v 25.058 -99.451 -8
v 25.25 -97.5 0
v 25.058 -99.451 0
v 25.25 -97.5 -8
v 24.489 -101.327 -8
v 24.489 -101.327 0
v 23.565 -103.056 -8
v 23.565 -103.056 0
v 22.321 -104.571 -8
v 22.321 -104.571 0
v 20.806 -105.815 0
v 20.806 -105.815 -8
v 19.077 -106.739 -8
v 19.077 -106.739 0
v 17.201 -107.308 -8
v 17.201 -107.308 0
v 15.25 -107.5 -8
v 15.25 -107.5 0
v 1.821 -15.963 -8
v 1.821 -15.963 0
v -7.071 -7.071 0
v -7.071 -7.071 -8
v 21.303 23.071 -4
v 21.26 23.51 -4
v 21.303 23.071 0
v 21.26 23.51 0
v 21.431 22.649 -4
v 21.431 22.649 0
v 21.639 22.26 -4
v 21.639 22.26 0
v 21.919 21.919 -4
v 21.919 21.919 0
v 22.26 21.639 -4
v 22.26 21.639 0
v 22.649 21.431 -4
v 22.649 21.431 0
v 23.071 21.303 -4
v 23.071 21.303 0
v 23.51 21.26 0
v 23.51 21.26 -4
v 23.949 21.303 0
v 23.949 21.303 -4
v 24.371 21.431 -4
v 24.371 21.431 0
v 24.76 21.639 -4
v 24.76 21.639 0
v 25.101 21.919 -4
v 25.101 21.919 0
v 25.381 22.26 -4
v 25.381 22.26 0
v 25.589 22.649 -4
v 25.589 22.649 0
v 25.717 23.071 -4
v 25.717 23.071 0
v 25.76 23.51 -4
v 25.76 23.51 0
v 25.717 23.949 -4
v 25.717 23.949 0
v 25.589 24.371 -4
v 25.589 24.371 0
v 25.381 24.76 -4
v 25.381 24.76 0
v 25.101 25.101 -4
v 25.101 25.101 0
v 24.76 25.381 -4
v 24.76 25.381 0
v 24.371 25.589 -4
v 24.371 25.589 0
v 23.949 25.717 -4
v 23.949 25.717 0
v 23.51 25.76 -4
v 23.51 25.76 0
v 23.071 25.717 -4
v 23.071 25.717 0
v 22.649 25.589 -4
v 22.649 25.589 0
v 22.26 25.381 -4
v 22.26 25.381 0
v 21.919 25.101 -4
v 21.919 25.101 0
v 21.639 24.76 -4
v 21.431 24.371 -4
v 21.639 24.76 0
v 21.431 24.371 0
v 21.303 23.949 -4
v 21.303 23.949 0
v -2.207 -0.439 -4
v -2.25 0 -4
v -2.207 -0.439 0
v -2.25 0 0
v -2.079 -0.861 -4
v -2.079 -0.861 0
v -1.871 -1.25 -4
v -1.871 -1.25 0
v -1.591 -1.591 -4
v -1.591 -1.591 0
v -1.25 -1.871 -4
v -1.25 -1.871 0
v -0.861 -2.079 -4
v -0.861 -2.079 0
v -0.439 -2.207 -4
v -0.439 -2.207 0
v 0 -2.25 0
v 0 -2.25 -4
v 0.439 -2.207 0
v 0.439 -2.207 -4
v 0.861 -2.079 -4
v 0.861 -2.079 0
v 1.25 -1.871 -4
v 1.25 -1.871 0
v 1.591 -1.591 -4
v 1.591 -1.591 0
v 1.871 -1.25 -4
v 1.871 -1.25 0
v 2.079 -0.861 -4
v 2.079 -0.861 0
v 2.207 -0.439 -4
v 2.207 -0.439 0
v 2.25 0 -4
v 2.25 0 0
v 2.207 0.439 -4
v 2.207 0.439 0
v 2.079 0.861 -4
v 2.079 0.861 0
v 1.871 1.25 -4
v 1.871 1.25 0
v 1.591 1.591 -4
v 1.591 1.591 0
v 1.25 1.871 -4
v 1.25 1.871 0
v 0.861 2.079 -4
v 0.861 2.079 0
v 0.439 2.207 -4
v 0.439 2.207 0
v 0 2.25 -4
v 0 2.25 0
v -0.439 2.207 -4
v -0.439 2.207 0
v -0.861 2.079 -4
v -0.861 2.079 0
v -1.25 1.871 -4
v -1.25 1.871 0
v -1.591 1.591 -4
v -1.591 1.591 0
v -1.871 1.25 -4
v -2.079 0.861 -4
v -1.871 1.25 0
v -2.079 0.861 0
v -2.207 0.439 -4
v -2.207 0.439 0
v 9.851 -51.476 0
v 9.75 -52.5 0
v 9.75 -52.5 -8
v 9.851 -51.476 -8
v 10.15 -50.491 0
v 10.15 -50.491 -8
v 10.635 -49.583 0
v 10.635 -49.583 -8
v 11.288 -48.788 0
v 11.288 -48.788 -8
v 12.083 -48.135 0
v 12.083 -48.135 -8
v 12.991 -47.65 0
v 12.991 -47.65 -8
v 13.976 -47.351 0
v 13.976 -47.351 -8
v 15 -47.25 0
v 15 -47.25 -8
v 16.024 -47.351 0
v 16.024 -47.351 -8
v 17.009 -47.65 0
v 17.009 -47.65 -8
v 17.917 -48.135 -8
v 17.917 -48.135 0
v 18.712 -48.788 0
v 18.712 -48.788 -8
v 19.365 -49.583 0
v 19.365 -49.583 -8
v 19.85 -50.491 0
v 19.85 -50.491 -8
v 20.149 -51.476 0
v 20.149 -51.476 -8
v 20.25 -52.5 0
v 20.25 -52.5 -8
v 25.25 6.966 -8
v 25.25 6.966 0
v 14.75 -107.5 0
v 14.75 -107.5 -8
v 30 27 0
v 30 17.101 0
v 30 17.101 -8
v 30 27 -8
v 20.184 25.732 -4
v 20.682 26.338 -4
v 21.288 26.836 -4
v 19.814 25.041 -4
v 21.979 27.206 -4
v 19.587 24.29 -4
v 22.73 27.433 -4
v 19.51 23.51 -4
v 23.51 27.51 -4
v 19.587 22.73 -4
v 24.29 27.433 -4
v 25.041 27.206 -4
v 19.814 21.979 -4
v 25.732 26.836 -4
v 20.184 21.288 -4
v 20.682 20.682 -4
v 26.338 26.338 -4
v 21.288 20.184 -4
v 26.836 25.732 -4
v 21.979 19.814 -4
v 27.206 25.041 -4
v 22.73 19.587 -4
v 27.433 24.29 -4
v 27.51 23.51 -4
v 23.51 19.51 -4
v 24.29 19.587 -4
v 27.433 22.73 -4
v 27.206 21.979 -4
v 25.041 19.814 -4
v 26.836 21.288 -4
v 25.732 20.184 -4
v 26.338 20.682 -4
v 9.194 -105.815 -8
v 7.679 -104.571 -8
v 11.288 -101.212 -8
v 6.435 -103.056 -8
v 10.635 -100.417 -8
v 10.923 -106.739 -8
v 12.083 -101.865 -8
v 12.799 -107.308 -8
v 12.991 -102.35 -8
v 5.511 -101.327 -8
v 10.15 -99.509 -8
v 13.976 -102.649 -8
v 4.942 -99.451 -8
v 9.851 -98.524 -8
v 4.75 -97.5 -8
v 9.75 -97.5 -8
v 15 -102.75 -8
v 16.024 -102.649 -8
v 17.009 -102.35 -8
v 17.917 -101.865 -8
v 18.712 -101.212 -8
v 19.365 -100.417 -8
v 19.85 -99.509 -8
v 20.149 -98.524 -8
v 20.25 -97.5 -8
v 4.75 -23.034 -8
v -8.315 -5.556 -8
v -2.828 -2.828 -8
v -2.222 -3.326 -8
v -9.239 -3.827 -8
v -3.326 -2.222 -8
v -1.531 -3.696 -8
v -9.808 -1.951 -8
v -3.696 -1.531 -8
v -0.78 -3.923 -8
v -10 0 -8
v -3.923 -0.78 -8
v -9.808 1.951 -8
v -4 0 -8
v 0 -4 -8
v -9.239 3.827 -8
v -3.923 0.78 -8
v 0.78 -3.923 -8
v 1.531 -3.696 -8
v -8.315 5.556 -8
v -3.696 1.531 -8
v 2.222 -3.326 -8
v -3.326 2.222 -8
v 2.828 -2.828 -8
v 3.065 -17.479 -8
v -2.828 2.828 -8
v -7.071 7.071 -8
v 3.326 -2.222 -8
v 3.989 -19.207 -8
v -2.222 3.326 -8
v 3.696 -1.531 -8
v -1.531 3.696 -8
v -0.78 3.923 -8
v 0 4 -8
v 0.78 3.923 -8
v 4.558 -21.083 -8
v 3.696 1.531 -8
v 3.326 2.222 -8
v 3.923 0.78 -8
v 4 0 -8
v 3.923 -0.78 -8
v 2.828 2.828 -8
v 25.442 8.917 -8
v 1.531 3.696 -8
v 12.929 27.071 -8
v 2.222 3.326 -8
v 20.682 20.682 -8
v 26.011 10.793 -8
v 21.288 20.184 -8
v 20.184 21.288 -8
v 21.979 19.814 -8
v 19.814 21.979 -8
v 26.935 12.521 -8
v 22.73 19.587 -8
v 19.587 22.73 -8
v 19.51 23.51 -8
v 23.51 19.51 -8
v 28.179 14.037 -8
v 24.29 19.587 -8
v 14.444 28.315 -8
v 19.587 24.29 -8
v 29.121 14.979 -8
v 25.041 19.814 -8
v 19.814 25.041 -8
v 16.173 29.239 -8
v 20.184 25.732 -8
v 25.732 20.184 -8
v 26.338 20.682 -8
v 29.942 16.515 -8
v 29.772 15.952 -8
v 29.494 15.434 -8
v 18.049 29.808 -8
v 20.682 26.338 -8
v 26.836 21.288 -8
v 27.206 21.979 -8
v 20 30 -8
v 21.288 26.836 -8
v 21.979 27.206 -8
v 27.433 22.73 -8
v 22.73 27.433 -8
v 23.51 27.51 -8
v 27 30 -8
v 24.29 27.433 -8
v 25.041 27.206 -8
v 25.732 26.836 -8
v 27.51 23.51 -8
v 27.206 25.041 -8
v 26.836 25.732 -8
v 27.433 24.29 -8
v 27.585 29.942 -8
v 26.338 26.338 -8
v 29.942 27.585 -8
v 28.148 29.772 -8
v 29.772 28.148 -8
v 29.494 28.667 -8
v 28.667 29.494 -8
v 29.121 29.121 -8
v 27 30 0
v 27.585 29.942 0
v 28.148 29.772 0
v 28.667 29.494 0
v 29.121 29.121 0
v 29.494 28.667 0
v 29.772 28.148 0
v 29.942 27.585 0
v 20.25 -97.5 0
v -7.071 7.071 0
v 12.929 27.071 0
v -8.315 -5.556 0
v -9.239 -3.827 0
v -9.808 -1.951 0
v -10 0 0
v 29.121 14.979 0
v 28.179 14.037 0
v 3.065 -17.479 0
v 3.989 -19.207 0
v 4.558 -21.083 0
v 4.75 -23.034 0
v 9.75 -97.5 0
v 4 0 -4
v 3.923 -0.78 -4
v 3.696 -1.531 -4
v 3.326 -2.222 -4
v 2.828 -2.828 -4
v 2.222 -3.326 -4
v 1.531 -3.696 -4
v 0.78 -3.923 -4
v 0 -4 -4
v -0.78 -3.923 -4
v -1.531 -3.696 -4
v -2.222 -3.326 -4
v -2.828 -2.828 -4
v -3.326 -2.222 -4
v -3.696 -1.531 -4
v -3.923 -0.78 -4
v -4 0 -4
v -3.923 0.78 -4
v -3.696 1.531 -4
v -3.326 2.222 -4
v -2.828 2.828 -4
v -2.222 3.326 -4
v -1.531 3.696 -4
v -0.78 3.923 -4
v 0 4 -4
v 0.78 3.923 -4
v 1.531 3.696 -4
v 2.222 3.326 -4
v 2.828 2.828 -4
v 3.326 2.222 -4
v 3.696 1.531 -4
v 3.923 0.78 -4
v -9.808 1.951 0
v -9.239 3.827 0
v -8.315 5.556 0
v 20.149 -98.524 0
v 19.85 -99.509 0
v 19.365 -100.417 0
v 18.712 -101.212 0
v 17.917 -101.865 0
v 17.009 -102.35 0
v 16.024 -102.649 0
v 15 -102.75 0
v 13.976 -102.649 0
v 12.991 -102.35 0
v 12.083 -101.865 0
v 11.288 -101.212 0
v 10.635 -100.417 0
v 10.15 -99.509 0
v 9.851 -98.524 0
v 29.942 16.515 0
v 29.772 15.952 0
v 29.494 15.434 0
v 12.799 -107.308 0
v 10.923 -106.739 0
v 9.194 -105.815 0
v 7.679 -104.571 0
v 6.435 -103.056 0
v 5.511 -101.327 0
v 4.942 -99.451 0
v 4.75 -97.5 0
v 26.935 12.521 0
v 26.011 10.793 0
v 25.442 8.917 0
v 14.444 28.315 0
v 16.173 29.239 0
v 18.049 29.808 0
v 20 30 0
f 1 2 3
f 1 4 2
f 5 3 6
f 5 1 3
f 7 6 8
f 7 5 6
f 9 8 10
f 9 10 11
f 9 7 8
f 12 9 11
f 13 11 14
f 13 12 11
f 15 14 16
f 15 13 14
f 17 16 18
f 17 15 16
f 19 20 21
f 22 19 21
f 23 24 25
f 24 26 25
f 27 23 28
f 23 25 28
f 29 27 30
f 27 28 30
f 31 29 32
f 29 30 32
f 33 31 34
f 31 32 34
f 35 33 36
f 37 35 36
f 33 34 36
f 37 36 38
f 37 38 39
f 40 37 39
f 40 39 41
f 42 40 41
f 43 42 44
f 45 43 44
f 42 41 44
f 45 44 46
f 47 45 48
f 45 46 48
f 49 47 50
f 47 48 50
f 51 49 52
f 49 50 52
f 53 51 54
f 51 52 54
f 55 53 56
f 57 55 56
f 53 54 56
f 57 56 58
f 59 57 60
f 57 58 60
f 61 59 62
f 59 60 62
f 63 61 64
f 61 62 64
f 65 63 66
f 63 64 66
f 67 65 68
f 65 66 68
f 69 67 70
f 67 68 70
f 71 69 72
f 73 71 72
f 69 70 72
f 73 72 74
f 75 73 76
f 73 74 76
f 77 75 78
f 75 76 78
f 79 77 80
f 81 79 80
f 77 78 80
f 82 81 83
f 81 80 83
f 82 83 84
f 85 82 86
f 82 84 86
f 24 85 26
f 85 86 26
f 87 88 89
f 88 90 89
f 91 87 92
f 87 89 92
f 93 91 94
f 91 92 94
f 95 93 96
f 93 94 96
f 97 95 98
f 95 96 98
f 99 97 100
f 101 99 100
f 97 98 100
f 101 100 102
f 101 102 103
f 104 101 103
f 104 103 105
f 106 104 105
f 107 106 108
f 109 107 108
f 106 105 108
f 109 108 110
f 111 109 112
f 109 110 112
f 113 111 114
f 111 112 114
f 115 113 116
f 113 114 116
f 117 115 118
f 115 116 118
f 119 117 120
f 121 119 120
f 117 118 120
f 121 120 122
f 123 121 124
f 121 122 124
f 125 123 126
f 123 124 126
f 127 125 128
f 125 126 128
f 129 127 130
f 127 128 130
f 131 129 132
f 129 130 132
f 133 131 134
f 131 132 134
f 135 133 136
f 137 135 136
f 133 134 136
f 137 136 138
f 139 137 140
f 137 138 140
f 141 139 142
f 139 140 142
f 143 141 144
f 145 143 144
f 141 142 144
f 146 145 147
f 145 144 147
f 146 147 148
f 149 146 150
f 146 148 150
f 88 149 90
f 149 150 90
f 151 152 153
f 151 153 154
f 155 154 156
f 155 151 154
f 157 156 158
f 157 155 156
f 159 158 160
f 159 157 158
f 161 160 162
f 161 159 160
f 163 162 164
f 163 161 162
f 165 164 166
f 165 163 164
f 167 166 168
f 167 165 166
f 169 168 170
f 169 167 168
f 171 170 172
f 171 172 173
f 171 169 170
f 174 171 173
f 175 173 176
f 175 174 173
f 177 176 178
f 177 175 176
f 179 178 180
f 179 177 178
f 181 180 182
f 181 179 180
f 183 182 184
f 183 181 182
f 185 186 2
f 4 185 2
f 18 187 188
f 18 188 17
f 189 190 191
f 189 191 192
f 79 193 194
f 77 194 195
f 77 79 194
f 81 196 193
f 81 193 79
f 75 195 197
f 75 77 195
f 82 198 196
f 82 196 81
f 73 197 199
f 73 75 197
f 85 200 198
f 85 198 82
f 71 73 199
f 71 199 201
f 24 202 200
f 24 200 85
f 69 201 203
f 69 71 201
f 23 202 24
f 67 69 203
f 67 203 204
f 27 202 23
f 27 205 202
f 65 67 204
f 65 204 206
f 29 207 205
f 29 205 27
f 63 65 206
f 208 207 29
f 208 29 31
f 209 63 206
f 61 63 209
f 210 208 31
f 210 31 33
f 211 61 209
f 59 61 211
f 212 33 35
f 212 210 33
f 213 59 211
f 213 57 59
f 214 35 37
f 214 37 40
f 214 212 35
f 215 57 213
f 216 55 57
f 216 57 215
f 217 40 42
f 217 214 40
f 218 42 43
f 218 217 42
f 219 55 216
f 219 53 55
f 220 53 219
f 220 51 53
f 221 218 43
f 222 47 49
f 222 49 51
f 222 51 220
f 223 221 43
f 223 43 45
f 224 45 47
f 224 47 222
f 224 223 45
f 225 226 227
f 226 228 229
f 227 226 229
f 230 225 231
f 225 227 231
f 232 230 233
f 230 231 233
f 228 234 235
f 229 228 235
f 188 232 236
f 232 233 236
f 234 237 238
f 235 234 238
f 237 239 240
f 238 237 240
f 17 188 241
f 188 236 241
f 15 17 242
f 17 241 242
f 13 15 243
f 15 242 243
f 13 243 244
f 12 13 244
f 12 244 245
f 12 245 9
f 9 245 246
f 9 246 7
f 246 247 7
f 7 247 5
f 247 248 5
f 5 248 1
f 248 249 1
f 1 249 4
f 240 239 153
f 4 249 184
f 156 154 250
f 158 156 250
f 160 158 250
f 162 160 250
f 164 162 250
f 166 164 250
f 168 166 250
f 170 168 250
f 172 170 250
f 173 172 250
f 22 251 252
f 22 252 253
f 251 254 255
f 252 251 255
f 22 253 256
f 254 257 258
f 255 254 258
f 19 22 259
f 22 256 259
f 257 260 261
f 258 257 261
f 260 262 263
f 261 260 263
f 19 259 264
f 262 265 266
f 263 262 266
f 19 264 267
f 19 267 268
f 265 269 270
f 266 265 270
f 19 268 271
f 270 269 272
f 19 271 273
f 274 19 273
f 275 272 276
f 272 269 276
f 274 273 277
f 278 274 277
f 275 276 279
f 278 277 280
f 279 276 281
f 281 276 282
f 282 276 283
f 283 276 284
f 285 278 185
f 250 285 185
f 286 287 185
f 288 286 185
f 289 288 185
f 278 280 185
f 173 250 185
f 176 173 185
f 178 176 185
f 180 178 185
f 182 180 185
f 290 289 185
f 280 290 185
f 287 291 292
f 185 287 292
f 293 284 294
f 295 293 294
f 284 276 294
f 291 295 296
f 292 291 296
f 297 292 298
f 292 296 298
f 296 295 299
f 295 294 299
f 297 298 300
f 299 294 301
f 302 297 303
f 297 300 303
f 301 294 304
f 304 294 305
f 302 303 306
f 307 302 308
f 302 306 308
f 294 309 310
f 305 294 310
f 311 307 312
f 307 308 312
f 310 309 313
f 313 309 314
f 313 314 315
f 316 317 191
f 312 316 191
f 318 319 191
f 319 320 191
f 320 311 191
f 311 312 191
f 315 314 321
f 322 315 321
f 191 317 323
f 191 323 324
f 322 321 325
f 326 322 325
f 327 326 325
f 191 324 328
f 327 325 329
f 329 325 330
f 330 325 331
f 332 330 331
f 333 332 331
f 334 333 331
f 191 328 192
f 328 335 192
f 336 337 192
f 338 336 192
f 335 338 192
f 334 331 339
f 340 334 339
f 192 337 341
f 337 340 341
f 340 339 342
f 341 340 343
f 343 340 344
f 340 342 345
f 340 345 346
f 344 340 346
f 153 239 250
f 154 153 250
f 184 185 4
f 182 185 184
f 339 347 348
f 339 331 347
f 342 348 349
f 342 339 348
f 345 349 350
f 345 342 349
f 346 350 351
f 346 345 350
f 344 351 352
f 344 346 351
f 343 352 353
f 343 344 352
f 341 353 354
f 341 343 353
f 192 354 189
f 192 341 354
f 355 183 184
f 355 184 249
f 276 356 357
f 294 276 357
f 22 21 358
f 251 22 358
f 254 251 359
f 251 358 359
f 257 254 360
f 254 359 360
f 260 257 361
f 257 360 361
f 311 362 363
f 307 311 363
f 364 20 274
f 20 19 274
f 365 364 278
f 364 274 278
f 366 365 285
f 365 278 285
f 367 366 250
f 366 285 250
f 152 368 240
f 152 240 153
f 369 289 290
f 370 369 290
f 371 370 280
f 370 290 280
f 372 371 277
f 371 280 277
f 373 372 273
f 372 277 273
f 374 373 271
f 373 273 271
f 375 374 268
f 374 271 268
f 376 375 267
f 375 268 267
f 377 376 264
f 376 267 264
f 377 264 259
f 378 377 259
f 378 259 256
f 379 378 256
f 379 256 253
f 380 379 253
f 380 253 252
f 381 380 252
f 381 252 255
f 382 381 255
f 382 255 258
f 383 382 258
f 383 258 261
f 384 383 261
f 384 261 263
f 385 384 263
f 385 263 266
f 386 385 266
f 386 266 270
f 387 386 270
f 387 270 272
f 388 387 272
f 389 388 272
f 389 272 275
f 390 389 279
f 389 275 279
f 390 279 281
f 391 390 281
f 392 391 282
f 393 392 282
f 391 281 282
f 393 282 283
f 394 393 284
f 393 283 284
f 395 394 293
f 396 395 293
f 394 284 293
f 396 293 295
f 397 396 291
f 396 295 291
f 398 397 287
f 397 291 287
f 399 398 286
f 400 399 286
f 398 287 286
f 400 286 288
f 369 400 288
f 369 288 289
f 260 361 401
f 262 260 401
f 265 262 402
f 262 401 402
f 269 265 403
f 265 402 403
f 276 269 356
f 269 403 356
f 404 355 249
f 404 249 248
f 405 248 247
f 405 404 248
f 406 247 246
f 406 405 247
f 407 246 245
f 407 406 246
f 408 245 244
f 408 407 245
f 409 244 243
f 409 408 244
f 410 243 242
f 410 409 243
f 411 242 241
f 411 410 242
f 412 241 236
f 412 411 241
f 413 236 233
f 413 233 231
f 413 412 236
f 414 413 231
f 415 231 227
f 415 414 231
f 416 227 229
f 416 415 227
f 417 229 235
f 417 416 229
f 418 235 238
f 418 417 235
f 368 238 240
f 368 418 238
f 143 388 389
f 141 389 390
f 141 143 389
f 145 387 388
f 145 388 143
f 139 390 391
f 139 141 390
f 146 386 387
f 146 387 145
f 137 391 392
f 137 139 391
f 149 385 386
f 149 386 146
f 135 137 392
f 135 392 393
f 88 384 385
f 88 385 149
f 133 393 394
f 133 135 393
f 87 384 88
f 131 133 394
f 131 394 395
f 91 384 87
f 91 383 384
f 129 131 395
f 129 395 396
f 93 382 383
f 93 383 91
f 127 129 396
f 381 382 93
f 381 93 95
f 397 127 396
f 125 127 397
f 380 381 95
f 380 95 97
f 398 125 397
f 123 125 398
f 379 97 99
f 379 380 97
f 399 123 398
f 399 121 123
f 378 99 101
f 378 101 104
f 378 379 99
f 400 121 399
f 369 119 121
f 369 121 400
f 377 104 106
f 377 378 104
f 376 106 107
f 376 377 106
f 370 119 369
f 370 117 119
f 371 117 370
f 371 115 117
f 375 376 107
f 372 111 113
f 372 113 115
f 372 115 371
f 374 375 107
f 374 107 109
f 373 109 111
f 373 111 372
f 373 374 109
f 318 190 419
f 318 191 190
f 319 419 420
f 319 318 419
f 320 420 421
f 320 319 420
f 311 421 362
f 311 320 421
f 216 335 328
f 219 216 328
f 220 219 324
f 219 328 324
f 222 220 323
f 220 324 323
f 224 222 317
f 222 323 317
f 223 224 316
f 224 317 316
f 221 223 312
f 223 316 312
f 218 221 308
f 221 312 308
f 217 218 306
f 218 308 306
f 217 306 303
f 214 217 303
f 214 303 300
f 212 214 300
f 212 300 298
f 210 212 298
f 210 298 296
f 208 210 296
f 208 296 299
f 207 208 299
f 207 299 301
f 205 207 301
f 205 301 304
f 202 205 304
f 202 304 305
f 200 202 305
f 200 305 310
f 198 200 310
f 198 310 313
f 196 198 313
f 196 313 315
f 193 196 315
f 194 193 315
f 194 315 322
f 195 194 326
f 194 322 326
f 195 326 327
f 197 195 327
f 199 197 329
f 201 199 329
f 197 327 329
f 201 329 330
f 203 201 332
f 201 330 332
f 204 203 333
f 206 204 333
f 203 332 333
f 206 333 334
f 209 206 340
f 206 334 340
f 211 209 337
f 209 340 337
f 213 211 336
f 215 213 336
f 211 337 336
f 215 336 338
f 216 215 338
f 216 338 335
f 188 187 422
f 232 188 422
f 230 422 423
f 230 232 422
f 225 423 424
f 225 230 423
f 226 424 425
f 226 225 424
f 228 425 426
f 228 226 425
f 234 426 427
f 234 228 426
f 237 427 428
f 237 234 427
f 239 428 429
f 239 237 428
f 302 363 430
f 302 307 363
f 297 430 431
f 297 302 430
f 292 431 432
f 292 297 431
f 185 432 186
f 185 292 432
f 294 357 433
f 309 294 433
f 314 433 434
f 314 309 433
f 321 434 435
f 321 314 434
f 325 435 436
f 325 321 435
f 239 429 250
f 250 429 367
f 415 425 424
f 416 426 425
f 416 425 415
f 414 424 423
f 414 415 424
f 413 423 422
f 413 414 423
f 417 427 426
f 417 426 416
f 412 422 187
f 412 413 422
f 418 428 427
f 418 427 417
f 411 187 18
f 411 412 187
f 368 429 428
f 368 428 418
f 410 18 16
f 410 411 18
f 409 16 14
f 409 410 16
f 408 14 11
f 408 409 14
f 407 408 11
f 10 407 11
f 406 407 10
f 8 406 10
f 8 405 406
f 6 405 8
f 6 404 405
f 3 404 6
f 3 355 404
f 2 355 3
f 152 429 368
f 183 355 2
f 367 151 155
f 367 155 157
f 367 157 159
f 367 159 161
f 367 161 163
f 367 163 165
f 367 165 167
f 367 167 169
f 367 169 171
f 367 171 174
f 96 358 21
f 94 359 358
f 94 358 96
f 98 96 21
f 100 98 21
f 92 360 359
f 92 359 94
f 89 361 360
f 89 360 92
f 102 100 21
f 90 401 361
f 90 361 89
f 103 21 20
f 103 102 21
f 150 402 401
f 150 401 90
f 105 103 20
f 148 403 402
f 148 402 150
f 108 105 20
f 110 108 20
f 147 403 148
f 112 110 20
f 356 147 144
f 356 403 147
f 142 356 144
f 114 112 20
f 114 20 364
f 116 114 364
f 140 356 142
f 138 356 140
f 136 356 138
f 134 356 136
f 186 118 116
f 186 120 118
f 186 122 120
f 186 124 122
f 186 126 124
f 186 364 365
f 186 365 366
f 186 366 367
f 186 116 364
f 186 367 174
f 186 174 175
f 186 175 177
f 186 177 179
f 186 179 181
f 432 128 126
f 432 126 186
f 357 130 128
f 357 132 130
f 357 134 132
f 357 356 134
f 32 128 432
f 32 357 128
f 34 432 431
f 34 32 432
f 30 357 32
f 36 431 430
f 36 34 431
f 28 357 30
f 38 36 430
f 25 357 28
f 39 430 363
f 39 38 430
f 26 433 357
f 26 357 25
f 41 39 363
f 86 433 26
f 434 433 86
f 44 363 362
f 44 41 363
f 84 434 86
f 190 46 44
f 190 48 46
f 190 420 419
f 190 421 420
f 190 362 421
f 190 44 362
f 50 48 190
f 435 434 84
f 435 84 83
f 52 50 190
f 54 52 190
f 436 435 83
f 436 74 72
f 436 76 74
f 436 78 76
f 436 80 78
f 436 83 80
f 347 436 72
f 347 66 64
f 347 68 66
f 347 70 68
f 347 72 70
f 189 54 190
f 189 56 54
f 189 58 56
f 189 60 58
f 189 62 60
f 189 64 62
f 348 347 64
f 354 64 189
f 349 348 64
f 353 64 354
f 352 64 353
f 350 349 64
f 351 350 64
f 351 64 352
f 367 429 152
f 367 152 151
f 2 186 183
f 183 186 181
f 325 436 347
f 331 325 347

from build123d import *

# Parameters (mm, degrees)
SKETCH1_W                      = 40
SKETCH1_H                      = 137.5
BOSS_EXTRUDE1_DEPTH            = 8
CBORE_FOR_M4_SHCS1_D           = 4.5
CBORE_FOR_M4_SHCS1_CBORE_D     = 8
CBORE_FOR_M4_SHCS1_CBORE_DEPTH = 4
CUT_EXTRUDE1_DEPTH             = 112.893922981
FILLET1_R                      = 10
FILLET2_R                      = 3


with BuildPart() as part:
    # Sketch1 → Boss-Extrude1 (new body)
    with BuildSketch(Plane.XY):
        with Locations((10, -38.75)):
            Rectangle(SKETCH1_W, SKETCH1_H)
        with BuildLine():
            Line((20.25, -52.5), (20.25, -97.5))
            ThreePointArc((20.25, -97.5), (15, -102.75), (9.75, -97.5))
            Line((9.75, -97.5), (9.75, -52.5))
            ThreePointArc((9.75, -52.5), (15, -47.25), (20.25, -52.5))
        make_face(mode=Mode.SUBTRACT)
    extrude(amount=-BOSS_EXTRUDE1_DEPTH)

    # CBORE for M4 SHCS1 (through all)
    with Locations(Plane(origin=(0, 0, -8), x_dir=(1, 0, 0), z_dir=(0, 0, -1))):
        with Locations((0, 0), (23.51, -23.51)):
            CounterBoreHole(CBORE_FOR_M4_SHCS1_D / 2, CBORE_FOR_M4_SHCS1_CBORE_D / 2, CBORE_FOR_M4_SHCS1_CBORE_DEPTH)

    # Sketch6 → Cut-Extrude1 (cut, through all)
    with BuildSketch(Plane.XY):
        with BuildLine():
            Line((-10, -107.5), (4.75, -107.5))
            Line((4.75, -107.5), (4.75, -18.892135624))
            Line((4.75, -18.892135624), (-7.071067812, -7.071067812))
            ThreePointArc((-7.071067812, -7.071067812), (-9.238795322, -3.826834332), (-10, -1.8e-08))
            Line((-10, -1.8e-08), (-10, -107.5))
        make_face()
        with BuildLine():
            Line((-10, 30), (-10, -1.8e-08))
            ThreePointArc((-10, -1.8e-08), (-9.238795329, 3.826834315), (-7.071067812, 7.071067812))
            Line((-7.071067812, 7.071067812), (15.857864376, 30))
            Line((15.857864376, 30), (-10, 30))
        make_face()
        Polygon((25.25, 11.107864376), (25.25, -107.5), (30, -107.5), (30, 15.857864376), align=None)
    extrude(amount=-CUT_EXTRUDE1_DEPTH, mode=Mode.SUBTRACT)

    # Fillet1
    fillet1_edges = [part.edges().sort_by_distance(p)[0] for p in [
        (4.75, -18.892135624, -4),
        (4.75, -107.5, -4),
        (15.857864376, 30, -4),
        (25.25, 11.107864376, -4),
        (25.25, -107.5, -4),
    ]]
    fillet(fillet1_edges, radius=FILLET1_R)

    # Fillet2
    fillet2_edges = [part.edges().sort_by_distance(p)[0] for p in [
        (30, 15.857864376, -4),
        (30, 30, -4),
    ]]
    fillet(fillet2_edges, radius=FILLET2_R)


solid = part.part
